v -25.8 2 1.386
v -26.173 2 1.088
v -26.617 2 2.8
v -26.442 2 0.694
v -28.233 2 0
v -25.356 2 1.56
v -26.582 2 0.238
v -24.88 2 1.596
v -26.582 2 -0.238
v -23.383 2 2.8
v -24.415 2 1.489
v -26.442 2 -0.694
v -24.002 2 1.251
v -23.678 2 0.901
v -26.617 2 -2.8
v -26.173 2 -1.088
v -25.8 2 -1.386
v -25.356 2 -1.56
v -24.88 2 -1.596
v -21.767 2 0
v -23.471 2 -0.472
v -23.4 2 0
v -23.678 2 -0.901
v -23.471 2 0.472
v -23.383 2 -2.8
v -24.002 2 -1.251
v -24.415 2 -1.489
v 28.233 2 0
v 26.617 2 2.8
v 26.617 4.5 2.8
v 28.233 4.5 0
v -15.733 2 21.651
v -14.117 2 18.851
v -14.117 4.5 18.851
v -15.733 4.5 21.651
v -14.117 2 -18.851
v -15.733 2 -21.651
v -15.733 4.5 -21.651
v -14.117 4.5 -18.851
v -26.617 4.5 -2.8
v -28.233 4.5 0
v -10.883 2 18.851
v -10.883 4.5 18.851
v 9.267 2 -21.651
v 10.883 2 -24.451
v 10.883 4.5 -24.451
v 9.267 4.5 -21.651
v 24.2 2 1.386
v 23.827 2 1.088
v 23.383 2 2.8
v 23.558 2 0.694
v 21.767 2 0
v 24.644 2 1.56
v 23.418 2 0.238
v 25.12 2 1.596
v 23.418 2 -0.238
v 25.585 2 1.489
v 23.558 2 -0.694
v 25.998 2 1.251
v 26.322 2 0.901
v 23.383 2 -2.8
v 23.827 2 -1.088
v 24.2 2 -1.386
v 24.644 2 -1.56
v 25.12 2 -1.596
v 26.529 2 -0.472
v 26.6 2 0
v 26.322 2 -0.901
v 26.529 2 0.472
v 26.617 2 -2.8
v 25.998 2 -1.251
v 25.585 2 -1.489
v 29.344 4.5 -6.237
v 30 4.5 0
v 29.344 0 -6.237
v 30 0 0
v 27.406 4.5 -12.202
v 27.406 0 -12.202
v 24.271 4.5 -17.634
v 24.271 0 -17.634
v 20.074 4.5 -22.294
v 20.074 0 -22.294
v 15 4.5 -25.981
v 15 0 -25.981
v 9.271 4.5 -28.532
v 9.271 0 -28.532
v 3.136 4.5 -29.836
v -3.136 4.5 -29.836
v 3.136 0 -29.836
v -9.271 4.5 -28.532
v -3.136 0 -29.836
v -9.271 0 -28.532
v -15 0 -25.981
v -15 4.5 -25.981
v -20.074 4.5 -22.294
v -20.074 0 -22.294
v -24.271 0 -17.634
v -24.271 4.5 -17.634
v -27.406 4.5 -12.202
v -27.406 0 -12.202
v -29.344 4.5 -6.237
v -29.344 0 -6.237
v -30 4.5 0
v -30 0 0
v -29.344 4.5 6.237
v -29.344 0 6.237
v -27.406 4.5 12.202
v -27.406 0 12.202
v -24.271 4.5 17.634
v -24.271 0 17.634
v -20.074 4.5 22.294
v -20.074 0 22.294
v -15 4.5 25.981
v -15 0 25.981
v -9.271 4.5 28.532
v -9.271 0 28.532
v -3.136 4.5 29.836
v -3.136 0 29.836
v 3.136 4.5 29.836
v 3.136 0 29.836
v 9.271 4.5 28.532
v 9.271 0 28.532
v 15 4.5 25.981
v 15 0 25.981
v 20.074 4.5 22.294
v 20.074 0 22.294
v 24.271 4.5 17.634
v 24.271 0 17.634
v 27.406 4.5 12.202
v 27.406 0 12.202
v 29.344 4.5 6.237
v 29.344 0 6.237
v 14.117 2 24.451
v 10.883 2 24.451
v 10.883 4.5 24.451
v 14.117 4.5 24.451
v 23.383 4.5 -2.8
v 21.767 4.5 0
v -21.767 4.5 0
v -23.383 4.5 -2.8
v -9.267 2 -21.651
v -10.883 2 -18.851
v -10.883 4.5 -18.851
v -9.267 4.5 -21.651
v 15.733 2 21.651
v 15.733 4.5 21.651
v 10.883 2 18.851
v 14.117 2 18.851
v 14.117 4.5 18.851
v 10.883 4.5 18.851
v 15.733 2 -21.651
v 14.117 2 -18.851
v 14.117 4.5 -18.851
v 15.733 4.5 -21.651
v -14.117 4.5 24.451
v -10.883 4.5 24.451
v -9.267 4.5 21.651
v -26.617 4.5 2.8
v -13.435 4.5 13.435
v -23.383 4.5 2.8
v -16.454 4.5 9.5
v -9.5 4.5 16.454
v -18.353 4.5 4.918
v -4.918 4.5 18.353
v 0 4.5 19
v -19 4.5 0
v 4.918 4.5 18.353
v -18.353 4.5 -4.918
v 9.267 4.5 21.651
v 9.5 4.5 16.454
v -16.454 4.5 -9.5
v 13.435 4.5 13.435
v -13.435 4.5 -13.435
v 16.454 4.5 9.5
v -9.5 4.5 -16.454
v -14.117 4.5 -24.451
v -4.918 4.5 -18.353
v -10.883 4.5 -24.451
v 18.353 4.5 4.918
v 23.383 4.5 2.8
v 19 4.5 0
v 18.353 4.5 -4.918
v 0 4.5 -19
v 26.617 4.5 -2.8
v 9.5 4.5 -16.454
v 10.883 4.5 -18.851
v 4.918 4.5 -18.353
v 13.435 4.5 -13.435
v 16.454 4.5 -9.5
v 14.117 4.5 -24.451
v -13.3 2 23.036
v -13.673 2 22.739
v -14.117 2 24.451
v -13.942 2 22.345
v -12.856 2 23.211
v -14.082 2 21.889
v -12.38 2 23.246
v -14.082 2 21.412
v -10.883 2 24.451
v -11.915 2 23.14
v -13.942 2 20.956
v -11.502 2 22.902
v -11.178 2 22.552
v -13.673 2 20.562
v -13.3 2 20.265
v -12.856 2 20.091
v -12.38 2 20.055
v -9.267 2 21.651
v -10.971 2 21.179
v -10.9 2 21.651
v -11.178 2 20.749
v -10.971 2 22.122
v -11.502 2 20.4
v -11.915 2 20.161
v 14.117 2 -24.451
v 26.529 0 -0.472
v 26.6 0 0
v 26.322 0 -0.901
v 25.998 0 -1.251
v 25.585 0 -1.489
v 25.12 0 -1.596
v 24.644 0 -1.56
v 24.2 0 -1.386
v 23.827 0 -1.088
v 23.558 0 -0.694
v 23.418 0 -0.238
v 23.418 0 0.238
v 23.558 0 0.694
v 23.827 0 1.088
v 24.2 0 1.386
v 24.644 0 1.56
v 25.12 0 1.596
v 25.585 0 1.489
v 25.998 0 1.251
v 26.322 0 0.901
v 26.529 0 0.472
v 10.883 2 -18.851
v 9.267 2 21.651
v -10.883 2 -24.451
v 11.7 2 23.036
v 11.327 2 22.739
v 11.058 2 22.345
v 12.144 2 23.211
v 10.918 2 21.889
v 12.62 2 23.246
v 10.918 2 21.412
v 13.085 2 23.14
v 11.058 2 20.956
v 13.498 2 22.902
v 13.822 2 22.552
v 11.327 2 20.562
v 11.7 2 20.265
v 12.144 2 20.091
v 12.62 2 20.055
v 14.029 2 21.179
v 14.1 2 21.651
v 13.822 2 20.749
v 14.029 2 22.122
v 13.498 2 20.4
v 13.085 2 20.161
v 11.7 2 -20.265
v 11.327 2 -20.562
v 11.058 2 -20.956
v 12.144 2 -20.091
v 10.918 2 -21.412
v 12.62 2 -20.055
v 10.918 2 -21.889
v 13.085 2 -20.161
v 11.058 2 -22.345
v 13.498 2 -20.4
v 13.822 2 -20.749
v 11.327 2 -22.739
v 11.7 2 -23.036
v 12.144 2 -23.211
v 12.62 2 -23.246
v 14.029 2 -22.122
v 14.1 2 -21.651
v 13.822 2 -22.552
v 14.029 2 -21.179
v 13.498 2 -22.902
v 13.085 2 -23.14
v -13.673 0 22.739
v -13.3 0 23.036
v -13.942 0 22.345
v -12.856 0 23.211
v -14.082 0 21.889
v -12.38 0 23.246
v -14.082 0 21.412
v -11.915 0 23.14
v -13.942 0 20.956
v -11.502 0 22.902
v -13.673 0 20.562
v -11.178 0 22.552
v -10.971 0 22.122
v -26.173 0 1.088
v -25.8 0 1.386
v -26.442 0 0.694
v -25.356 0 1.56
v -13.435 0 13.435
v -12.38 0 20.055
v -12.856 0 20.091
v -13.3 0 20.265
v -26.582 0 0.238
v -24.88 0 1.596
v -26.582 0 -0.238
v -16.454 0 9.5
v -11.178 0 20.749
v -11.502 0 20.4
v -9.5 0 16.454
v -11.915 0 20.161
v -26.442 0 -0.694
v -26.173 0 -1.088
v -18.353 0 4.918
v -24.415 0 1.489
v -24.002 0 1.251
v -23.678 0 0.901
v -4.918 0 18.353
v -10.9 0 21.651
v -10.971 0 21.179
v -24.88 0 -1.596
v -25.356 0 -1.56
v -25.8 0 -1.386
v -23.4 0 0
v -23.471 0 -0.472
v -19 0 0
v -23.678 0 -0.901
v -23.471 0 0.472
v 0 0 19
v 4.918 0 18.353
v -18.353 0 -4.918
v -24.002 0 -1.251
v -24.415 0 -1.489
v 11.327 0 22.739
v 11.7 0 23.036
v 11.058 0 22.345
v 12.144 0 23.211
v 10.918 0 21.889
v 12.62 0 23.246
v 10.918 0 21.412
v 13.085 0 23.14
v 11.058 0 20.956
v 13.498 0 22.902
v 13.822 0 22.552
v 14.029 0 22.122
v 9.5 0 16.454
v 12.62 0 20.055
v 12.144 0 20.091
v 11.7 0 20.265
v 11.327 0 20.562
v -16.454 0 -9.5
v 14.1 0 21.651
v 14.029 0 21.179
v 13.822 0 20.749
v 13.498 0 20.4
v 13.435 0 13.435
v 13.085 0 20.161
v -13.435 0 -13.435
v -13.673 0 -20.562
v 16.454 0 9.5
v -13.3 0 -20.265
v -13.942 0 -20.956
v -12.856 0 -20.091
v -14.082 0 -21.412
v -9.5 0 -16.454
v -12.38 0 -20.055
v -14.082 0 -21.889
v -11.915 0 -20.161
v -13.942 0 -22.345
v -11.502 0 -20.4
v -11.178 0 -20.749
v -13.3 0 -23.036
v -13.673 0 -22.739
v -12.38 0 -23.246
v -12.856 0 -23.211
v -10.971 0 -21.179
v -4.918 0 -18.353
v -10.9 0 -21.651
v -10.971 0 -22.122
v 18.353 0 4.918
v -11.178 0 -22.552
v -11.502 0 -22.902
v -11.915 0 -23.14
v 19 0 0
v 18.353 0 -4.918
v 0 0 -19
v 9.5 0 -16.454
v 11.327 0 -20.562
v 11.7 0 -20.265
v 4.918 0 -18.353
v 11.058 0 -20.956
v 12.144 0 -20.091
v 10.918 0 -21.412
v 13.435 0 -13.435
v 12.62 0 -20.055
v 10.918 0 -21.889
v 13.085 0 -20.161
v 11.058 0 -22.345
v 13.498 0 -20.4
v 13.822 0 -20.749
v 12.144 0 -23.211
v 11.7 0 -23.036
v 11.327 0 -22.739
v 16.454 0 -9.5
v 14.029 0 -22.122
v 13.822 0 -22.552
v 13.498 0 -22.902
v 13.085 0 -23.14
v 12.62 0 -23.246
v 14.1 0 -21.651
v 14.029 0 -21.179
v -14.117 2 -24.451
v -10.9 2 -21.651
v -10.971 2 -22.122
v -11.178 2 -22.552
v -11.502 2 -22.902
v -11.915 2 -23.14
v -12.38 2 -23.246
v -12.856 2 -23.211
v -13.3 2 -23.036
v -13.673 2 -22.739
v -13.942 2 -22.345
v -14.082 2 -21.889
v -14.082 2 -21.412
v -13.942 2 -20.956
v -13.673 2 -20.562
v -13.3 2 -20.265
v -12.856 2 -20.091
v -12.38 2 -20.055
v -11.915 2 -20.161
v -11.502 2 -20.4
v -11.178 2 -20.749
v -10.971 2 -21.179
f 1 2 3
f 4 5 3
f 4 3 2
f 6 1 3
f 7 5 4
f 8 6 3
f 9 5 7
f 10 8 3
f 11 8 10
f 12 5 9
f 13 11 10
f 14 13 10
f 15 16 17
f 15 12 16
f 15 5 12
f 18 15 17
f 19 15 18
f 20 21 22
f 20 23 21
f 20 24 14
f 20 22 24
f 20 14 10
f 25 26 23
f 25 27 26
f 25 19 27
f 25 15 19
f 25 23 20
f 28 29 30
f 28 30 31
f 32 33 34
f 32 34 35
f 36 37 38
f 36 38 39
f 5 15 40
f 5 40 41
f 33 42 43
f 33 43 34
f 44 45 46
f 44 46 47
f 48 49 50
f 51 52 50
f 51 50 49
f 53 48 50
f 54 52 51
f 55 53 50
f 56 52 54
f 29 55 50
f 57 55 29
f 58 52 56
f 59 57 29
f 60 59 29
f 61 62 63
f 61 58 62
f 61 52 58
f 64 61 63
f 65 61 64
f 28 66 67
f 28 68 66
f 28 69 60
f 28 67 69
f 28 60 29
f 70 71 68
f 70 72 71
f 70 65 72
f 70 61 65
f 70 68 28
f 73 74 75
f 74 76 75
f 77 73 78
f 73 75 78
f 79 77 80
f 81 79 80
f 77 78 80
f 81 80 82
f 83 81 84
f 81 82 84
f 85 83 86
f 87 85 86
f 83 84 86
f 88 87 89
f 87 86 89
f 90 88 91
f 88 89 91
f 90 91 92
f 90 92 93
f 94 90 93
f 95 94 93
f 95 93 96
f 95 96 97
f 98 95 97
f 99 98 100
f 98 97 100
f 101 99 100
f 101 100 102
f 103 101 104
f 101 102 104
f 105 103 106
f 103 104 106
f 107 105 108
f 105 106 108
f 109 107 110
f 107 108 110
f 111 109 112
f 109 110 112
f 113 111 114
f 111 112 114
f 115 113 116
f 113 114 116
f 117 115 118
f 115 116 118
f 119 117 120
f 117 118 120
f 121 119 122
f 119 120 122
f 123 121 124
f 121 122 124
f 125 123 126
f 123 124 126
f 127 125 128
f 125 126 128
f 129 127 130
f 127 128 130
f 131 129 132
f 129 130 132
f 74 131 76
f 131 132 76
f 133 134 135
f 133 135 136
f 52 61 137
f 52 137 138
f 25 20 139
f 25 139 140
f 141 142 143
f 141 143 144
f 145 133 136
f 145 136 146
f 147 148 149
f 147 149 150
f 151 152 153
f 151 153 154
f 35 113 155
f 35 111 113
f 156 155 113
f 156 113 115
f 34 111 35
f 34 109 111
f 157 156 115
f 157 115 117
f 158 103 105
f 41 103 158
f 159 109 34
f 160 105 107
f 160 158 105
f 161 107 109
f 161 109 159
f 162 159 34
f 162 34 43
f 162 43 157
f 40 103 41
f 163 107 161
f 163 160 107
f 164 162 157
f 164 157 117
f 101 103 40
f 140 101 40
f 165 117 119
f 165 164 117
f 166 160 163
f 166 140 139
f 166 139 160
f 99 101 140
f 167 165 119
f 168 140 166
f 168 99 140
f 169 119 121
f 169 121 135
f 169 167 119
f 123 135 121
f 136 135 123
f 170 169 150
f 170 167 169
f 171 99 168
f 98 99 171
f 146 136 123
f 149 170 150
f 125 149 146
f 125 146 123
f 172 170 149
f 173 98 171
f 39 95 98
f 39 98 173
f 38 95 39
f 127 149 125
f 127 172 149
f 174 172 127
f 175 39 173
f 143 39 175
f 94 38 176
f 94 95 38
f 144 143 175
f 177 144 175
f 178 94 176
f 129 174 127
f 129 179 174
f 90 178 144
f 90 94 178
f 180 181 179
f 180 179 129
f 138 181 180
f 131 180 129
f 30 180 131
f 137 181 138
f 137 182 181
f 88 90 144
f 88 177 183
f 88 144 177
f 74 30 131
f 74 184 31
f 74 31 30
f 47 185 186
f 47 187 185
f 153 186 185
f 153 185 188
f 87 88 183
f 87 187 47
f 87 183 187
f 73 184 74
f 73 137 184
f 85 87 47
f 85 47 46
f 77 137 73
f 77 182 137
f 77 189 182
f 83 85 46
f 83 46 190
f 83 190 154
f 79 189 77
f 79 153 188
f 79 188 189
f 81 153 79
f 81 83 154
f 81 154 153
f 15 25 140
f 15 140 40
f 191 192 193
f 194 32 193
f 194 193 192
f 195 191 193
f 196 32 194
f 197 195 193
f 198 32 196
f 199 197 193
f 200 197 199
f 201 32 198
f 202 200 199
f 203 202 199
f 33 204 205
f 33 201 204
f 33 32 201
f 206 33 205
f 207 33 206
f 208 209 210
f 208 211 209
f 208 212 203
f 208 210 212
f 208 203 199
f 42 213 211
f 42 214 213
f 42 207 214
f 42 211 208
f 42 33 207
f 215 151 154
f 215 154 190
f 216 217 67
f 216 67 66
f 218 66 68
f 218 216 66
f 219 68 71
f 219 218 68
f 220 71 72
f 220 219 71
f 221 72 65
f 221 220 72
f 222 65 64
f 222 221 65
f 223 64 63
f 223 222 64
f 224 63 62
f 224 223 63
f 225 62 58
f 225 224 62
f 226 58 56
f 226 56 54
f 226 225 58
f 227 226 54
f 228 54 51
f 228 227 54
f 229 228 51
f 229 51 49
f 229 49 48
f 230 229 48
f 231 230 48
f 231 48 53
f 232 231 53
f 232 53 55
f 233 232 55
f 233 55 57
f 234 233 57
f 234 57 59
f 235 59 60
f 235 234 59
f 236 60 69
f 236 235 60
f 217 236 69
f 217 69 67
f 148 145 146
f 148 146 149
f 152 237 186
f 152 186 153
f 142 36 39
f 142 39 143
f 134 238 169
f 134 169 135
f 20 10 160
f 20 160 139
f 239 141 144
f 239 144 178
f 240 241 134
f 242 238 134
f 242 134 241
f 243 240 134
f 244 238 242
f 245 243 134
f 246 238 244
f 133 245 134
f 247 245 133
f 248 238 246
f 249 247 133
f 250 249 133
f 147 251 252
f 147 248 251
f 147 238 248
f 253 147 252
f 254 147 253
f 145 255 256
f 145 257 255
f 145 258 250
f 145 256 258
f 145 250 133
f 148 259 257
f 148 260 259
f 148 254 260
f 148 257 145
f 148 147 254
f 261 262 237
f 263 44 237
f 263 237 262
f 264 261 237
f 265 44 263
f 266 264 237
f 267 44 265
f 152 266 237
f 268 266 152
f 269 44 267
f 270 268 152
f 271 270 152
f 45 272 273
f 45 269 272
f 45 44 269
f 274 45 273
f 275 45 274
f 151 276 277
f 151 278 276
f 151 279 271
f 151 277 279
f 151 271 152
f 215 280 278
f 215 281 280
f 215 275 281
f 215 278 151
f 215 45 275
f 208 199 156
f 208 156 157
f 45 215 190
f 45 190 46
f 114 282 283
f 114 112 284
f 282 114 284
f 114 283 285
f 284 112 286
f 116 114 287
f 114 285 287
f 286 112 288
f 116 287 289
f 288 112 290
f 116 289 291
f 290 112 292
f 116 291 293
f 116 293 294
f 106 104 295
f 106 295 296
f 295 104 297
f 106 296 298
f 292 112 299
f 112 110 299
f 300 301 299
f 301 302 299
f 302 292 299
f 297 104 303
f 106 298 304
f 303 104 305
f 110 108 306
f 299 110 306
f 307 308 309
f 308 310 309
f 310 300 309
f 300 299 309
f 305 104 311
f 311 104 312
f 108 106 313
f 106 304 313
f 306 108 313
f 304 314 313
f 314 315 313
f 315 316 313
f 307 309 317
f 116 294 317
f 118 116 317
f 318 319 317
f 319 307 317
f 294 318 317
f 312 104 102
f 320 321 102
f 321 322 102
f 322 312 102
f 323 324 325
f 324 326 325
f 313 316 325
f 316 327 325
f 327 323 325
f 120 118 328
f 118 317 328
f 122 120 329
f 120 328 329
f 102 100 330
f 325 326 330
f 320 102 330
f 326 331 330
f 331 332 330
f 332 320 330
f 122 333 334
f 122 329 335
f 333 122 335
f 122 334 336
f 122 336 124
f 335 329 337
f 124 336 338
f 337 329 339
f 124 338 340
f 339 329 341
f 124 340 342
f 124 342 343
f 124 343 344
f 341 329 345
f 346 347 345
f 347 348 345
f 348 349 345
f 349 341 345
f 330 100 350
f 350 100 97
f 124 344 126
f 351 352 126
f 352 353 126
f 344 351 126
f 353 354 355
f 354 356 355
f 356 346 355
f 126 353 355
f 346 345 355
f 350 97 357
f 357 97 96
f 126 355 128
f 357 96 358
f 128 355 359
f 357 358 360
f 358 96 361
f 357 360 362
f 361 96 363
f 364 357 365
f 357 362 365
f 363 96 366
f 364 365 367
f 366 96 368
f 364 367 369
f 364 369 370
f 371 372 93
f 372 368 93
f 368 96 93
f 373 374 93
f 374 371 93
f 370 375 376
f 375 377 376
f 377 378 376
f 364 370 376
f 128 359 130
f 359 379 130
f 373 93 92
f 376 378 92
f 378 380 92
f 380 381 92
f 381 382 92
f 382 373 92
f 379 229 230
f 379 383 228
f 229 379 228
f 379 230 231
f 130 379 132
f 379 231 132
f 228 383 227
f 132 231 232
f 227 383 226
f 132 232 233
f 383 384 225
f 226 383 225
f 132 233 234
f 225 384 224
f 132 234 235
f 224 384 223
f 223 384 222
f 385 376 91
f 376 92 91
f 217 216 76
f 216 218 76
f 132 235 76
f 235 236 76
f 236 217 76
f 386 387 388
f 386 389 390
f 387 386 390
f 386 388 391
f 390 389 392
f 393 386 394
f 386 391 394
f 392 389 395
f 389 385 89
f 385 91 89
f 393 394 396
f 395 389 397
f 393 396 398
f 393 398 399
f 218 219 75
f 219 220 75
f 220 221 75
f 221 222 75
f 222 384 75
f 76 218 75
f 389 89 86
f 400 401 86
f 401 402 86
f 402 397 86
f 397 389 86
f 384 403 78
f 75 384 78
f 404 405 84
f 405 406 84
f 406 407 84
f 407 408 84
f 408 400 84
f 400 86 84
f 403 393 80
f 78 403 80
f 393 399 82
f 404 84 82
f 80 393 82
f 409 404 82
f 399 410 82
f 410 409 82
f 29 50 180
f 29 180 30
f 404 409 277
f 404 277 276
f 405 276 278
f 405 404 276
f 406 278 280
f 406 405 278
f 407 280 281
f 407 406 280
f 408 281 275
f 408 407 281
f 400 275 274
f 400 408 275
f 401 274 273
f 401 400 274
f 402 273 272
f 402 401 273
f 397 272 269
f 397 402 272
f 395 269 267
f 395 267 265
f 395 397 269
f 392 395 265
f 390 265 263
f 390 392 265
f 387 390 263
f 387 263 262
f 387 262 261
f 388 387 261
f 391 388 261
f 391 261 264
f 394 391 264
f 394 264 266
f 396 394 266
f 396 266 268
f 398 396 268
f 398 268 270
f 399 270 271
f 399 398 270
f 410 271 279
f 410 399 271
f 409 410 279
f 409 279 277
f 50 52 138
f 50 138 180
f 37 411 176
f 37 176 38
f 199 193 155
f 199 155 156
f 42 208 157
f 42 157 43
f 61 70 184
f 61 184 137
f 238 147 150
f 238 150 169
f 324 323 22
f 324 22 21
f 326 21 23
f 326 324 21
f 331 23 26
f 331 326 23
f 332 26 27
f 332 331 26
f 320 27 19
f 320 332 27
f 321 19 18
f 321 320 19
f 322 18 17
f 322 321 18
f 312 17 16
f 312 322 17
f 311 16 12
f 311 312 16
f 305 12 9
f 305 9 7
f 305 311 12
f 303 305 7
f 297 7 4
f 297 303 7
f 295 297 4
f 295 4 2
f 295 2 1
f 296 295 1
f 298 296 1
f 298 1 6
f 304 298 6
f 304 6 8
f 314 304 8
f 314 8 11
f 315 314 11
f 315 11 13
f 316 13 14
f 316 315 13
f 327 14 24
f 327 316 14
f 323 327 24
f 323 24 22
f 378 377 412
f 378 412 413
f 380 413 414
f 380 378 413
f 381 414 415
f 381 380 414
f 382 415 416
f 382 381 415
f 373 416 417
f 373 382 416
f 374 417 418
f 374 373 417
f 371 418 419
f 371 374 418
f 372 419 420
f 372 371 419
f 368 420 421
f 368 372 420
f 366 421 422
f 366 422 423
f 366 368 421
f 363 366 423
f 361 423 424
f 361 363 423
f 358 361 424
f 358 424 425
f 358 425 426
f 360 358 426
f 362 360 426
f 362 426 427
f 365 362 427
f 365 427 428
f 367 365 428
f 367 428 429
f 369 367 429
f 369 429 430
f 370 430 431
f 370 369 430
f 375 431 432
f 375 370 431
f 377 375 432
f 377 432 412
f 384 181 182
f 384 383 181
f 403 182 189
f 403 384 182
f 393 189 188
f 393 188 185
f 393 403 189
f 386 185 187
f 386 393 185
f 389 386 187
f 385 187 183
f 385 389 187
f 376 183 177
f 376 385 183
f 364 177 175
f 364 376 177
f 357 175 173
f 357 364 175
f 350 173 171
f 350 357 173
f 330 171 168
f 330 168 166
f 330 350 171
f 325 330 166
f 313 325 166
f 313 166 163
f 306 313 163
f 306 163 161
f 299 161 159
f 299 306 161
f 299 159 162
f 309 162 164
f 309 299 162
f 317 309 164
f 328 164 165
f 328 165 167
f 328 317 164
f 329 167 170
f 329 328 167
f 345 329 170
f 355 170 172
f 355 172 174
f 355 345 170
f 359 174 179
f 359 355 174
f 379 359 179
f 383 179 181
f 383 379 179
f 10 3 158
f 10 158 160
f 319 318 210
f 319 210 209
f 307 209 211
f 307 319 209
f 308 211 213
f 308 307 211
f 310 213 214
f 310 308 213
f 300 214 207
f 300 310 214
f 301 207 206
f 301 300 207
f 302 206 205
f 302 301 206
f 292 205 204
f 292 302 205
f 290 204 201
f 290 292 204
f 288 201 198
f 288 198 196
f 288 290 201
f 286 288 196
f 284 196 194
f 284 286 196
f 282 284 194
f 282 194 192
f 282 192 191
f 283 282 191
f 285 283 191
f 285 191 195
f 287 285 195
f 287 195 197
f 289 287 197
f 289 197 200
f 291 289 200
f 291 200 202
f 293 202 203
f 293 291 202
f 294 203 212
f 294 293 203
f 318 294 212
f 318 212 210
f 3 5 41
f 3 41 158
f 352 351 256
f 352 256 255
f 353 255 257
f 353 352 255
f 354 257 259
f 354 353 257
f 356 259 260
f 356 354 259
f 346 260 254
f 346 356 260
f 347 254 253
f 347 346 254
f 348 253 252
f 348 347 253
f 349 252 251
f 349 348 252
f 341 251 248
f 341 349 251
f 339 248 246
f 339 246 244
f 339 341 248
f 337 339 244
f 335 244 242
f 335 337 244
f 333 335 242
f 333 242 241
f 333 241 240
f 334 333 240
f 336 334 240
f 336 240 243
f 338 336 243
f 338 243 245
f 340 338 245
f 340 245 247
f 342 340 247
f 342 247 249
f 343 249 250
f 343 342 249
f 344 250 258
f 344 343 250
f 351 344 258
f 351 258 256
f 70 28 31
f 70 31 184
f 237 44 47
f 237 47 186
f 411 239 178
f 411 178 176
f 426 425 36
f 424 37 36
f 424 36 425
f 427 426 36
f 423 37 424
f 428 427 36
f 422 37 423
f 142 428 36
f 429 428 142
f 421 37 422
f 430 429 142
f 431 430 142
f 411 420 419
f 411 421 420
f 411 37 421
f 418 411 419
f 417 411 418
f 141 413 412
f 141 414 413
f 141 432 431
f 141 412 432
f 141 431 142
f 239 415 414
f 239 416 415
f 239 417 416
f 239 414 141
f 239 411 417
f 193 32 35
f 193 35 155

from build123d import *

# Parameters (mm, degrees)
SKETCH1_R           = 30
SKETCH1_R_2         = 19
SKETCH1_R_3         = 1.6
BOSS_EXTRUDE1_DEPTH = 2
SKETCH2_R           = 30
SKETCH2_R_2         = 19
BOSS_EXTRUDE3_DEPTH = 2.5


with BuildPart() as part:
    # Sketch1 → Boss-Extrude1 (new body)
    with BuildSketch(Plane(origin=(0, 0, 0), x_dir=(1, 0, 0), z_dir=(0, 1, 0))):
        Circle(SKETCH1_R)
        Circle(SKETCH1_R_2, mode=Mode.SUBTRACT)
        with Locations((25, 0)):
            Circle(SKETCH1_R_3, mode=Mode.SUBTRACT)
        with Locations((12.5, -21.650635095)):
            Circle(SKETCH1_R_3, mode=Mode.SUBTRACT)
        with Locations((-12.5, -21.650635095)):
            Circle(SKETCH1_R_3, mode=Mode.SUBTRACT)
        with Locations((-25, 0)):
            Circle(SKETCH1_R_3, mode=Mode.SUBTRACT)
        with Locations((-12.5, 21.650635095)):
            Circle(SKETCH1_R_3, mode=Mode.SUBTRACT)
        with Locations((12.5, 21.650635095)):
            Circle(SKETCH1_R_3, mode=Mode.SUBTRACT)
    extrude(amount=BOSS_EXTRUDE1_DEPTH)

    # Sketch2 → Boss-Extrude3 (add)
    with BuildSketch(Plane(origin=(0, 2, 0), x_dir=(1, 0, 0), z_dir=(0, 1, 0))):
        Circle(SKETCH2_R)
        Circle(SKETCH2_R_2, mode=Mode.SUBTRACT)
        Polygon((14.116580754, -24.450635095), (15.733161507, -21.650635095), (14.116580754, -18.850635095), (10.883419246, -18.850635095), (9.266838493, -21.650635095), (10.883419246, -24.450635095), align=None, mode=Mode.SUBTRACT)
        Polygon((28.233161507, 0), (26.616580754, 2.8), (23.383419246, 2.8), (21.766838493, 0), (23.383419246, -2.8), (26.616580754, -2.8), align=None, mode=Mode.SUBTRACT)
        Polygon((-14.116580754, -24.450635095), (-10.883419246, -24.450635095), (-9.266838493, -21.650635095), (-10.883419246, -18.850635095), (-14.116580754, -18.850635095), (-15.733161507, -21.650635095), align=None, mode=Mode.SUBTRACT)
        Polygon((-28.233161507, 0), (-26.616580754, -2.8), (-23.383419246, -2.8), (-21.766838493, 0), (-23.383419246, 2.8), (-26.616580754, 2.8), align=None, mode=Mode.SUBTRACT)
        Polygon((-14.116580754, 24.450635095), (-15.733161507, 21.650635095), (-14.116580754, 18.850635095), (-10.883419246, 18.850635095), (-9.266838493, 21.650635095), (-10.883419246, 24.450635095), align=None, mode=Mode.SUBTRACT)
        Polygon((14.116580754, 24.450635095), (10.883419246, 24.450635095), (9.266838493, 21.650635095), (10.883419246, 18.850635095), (14.116580754, 18.850635095), (15.733161507, 21.650635095), align=None, mode=Mode.SUBTRACT)
    extrude(amount=BOSS_EXTRUDE3_DEPTH)


solid = part.part
